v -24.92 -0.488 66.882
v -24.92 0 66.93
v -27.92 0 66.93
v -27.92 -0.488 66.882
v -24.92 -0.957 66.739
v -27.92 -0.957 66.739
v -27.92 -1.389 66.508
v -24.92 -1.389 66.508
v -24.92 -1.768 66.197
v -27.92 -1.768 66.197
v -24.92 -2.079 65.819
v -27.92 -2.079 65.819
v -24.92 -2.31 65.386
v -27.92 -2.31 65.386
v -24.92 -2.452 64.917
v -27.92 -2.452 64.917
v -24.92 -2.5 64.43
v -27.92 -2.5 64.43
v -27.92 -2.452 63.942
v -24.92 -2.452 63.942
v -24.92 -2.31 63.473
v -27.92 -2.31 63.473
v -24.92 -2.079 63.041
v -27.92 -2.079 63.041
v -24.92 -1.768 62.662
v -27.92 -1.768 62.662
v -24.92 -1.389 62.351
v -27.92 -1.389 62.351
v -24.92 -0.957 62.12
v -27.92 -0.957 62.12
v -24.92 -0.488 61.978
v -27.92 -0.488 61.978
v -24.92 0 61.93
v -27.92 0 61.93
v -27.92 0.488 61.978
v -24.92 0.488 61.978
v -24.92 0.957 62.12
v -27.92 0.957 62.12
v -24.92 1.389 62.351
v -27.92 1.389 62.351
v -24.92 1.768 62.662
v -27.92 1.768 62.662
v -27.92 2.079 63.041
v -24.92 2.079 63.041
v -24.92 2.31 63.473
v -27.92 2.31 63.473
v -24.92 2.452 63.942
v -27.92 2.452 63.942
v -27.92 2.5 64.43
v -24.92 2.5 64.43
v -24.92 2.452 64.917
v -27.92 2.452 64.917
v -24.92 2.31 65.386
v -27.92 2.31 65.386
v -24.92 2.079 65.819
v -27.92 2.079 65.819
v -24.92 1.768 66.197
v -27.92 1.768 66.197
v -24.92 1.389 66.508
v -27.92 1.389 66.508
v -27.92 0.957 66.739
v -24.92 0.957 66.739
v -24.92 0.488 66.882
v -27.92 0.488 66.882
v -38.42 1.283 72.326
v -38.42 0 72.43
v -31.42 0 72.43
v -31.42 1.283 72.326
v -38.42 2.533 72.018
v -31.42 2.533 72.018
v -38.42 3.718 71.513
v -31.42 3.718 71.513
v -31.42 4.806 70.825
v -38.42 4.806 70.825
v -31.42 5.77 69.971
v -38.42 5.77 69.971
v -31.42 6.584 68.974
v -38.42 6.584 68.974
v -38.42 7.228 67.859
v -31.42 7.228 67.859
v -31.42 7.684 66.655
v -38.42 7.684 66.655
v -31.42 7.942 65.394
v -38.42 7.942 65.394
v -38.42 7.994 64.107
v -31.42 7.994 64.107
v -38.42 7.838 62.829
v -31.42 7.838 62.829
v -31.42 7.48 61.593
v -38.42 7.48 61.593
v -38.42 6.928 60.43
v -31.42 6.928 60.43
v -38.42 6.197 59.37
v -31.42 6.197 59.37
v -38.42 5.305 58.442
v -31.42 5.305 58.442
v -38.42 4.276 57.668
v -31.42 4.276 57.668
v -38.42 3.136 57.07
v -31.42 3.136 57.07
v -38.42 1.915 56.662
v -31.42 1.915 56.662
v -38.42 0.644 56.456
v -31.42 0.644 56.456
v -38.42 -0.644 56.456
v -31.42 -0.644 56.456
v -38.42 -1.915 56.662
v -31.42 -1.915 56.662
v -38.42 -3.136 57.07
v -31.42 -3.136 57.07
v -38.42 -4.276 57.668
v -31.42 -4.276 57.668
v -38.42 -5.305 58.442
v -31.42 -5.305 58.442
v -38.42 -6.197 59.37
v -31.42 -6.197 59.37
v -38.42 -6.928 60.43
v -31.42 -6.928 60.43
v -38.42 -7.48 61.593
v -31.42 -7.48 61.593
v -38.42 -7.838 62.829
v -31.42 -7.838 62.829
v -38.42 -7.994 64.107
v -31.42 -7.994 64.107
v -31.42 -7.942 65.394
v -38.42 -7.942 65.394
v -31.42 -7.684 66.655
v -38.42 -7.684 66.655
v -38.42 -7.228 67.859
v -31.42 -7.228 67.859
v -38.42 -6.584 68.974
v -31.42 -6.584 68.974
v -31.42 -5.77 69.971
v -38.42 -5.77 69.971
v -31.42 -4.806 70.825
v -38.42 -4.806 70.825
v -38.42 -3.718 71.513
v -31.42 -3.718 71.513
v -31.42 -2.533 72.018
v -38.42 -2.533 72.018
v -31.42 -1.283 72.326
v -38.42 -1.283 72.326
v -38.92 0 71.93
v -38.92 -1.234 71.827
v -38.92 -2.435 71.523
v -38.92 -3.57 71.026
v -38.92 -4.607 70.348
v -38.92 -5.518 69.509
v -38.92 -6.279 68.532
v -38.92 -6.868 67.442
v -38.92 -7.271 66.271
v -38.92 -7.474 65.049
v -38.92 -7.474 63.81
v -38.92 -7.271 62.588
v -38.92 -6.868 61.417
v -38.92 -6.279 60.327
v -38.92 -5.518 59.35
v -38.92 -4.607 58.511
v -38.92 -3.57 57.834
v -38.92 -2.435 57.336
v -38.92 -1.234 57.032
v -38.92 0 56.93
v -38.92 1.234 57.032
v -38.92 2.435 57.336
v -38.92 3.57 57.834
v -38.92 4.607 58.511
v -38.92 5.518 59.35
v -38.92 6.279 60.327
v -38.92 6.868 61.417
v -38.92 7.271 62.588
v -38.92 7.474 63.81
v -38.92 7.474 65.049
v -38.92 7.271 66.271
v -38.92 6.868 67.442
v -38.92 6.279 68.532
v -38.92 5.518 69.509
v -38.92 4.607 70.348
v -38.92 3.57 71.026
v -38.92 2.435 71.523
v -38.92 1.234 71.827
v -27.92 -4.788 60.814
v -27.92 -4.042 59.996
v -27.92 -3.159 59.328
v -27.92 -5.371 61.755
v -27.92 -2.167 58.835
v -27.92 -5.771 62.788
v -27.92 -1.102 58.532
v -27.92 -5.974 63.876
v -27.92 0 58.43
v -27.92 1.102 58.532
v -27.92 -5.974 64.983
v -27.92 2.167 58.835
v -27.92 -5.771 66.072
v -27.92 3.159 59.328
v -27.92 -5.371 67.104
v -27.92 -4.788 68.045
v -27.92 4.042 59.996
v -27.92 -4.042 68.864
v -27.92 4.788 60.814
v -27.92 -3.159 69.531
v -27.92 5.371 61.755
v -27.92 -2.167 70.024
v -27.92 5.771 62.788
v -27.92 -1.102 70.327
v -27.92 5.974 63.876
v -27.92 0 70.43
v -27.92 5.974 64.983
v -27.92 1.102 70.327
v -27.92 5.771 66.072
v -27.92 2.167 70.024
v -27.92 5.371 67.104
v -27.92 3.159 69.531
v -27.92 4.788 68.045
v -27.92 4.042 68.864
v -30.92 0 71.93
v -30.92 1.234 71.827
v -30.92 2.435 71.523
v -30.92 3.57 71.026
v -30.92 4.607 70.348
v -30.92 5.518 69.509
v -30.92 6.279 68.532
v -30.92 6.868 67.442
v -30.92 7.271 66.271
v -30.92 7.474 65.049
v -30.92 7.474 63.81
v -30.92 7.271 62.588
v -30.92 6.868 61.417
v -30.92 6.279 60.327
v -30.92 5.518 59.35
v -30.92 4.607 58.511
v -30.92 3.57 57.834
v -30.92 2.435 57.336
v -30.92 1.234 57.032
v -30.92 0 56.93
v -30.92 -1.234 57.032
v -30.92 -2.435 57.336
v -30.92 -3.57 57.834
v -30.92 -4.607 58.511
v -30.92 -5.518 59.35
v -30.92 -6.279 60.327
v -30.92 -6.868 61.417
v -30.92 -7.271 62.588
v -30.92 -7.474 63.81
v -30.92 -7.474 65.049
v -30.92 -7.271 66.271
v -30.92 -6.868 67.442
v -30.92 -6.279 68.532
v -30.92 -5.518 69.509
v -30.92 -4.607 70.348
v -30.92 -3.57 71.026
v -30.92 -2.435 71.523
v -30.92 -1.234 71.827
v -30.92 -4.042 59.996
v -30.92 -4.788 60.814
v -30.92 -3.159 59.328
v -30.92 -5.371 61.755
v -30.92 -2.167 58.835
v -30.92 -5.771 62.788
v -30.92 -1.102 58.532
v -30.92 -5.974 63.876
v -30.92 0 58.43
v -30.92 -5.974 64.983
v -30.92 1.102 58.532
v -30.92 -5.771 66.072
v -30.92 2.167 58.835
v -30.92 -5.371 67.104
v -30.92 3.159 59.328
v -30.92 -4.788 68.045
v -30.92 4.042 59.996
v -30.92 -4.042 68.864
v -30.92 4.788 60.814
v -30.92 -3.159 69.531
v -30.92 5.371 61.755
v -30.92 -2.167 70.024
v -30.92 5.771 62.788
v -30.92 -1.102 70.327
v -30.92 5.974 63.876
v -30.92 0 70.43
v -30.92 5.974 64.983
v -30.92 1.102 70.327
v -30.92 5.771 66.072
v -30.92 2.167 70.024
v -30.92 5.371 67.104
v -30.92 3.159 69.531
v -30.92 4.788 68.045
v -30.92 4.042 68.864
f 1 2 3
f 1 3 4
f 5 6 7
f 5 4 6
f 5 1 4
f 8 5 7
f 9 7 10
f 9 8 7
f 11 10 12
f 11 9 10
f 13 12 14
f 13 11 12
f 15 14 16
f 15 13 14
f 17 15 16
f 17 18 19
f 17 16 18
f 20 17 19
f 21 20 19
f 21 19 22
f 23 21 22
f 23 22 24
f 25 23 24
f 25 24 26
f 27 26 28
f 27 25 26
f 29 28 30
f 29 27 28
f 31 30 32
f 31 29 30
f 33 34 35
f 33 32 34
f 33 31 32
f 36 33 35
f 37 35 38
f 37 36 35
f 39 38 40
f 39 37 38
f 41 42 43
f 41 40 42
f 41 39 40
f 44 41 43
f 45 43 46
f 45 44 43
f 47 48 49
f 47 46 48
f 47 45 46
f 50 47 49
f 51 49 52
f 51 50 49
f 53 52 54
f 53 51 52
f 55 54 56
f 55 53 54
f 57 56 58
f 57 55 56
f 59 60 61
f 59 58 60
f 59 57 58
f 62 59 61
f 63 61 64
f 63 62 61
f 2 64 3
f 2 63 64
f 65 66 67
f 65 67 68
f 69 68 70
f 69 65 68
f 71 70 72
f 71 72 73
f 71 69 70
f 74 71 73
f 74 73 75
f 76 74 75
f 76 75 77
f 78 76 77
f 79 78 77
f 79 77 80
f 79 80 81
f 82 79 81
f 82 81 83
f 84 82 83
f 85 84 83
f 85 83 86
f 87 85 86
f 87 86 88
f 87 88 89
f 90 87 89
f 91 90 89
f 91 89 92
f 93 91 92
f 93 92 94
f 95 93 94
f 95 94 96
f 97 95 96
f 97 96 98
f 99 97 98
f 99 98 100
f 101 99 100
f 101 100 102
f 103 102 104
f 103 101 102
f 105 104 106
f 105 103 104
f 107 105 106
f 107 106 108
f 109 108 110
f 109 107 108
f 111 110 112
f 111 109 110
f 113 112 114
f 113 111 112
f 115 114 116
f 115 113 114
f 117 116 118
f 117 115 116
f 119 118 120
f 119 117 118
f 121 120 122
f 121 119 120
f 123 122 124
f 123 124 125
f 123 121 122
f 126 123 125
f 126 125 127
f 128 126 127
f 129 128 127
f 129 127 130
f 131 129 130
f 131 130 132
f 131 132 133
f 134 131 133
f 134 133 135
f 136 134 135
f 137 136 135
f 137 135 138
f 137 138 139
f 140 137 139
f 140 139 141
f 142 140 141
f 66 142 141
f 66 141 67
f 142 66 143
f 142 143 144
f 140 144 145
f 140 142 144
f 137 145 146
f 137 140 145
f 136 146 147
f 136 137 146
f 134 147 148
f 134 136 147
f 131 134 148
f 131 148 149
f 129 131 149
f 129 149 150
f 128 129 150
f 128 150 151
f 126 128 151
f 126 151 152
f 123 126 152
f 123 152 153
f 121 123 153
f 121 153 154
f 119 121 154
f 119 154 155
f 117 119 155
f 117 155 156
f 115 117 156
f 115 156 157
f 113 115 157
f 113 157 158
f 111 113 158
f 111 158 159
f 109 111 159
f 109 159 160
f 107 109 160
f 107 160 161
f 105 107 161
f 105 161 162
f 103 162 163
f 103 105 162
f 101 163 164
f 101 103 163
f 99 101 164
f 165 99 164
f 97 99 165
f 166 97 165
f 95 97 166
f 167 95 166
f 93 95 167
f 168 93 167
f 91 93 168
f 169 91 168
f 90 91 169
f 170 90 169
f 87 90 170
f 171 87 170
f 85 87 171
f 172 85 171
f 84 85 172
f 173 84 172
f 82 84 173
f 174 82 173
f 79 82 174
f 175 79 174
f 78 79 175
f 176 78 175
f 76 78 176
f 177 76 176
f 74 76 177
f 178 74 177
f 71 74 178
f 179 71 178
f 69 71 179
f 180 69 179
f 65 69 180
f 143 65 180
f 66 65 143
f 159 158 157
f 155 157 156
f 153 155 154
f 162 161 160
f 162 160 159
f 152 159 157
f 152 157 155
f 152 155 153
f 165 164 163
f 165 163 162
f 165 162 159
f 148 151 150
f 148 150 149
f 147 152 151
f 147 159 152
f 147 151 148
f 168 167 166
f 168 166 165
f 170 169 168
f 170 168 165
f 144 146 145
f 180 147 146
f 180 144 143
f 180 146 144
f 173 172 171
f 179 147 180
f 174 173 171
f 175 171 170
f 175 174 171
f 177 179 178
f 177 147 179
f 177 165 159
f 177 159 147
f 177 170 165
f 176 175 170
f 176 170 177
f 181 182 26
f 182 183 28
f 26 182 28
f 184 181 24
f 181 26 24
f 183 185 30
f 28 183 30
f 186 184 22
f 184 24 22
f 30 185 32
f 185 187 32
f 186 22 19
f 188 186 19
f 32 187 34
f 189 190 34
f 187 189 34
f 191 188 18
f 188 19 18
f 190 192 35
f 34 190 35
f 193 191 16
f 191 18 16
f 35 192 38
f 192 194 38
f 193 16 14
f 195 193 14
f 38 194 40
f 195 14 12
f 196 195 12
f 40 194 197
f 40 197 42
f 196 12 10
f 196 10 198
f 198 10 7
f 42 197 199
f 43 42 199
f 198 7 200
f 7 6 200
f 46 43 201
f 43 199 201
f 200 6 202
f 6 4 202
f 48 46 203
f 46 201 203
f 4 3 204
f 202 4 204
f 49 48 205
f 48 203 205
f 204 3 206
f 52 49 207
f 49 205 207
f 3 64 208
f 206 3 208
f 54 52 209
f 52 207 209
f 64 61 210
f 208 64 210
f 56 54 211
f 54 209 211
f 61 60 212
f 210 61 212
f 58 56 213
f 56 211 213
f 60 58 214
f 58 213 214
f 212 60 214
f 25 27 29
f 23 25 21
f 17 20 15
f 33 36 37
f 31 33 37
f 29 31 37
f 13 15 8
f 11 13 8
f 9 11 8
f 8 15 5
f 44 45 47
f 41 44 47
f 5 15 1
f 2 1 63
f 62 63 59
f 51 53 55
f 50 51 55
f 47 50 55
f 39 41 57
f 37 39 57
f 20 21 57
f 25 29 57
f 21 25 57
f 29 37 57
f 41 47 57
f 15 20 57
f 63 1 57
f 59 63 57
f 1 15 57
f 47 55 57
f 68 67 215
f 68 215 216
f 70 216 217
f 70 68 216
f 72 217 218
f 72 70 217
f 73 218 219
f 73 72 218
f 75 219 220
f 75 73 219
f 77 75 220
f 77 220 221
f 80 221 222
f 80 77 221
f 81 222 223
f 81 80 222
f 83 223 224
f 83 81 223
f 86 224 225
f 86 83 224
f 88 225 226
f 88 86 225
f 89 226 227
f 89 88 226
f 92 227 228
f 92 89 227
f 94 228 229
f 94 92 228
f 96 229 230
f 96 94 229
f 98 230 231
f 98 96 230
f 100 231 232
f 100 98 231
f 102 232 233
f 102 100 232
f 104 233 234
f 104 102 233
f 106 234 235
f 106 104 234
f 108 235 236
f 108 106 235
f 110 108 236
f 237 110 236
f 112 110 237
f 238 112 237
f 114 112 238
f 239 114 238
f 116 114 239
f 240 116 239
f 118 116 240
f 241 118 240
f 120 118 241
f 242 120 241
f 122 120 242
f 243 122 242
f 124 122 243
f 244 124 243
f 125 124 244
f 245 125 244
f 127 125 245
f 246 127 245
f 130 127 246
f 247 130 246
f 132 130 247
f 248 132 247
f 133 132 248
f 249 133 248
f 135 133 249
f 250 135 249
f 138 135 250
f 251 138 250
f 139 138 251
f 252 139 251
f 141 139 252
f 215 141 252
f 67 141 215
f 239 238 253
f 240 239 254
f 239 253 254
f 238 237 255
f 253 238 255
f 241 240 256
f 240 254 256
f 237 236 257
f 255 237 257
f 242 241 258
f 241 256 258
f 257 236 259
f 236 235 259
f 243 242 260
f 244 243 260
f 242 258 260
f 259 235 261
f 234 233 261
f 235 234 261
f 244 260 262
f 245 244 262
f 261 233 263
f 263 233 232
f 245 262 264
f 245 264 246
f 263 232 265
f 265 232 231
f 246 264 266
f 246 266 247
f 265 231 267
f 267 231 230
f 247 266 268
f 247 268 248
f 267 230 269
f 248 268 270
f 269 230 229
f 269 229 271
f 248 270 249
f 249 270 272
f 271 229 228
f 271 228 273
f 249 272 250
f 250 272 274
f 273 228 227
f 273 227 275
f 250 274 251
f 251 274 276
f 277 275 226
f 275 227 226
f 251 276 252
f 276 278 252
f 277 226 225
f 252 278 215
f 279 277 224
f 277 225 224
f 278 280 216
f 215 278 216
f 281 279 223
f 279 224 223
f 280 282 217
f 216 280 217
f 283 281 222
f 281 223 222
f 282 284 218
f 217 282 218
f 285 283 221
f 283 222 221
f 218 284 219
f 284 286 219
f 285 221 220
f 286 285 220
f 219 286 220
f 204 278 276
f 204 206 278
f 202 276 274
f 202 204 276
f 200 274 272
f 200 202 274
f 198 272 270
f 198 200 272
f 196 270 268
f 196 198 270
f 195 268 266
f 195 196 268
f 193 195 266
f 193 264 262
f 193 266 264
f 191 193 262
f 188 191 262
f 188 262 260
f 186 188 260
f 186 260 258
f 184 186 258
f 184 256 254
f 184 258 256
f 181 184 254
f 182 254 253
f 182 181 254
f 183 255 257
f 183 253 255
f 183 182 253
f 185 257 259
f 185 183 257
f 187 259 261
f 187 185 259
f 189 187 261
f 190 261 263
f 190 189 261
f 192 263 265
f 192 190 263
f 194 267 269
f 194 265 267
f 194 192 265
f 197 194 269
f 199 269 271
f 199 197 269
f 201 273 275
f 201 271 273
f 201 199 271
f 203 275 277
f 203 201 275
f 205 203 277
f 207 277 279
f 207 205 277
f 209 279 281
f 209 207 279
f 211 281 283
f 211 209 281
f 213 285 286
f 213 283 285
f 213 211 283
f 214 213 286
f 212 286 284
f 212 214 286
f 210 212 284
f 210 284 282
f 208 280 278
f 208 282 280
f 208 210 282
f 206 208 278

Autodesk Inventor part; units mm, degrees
ref_plane "YZ Plane" through (0, 0, 0) normal (1, 0, 0) x (0, 1, 0)
ref_plane "XZ Plane" through (0, 0, 0) normal (0, 1, 0) x (-1, 0, 0)
ref_plane "XY Plane" through (0, 0, 0) normal (0, 0, 1) x (1, 0, 0)
sketch "スケッチ1" plane through (0, 0, 0) normal (0, 1, 0) x (-1, 0, 0)
  line L0 (-5.0796, -45.5704) -> (-5.0796, 73.9296)
  line L1 (-5.0796, 73.9296) -> (-4.5796, 74.4296)
  line L2 (-4.5796, 74.4296) -> (24.4204, 74.4296)
  line L3 (24.4204, 74.4296) -> (24.9204, 73.9296)
  line L4 (24.9204, 73.9296) -> (24.9204, -45.5704)
  line L5 (24.9204, -45.5704) -> (-5.0796, -45.5704)
  line L6 (1.9204, -47.0704) -> (1.9204, -50.5704)
  line L7 (1.9204, -50.5704) -> (17.9204, -50.5704)
  line L8 (17.9204, -50.5704) -> (17.9204, -47.0704)
  line L9 (17.9204, -47.0704) -> (1.9204, -47.0704)
  line L10 (2.9204, -47.0704) -> (2.9204, -45.5704)
  line L11 (16.9204, -45.5704) -> (16.9204, -47.0704)
  line L12 (31.4204, 56.4296) -> (30.9204, 56.9296)
  line L13 (30.9204, 56.9296) -> (30.9204, 71.9296)
  line L14 (30.9204, 71.9296) -> (31.4204, 72.4296)
  line L15 (31.4204, 72.4296) -> (38.4204, 72.4296)
  line L16 (38.4204, 72.4296) -> (38.9204, 71.9296)
  line L17 (38.9204, 71.9296) -> (38.9204, 56.9296)
  line L18 (38.9204, 56.9296) -> (38.4204, 56.4296)
  line L19 (38.4204, 56.4296) -> (31.4204, 56.4296)
  line L20 (31.4204, 56.4296) -> (31.4204, 72.4296)
  line L21 (30.9204, 70.4296) -> (27.9204, 70.4296)
  line L22 (27.9204, 70.4296) -> (27.9204, 58.4296)
  line L23 (27.9204, 58.4296) -> (30.9204, 58.4296)
  line L24 (38.4204, 56.4296) -> (38.4204, 72.4296)
  line L25 (27.9204, 66.9296) -> (24.9204, 66.9296)
  line L26 (27.4204, 66.9296) -> (27.4204, 61.9296)
  line L27 (27.9204, 61.9296) -> (24.9204, 61.9296)
  line L28 (24.9204, 73.9296) -> (-5.0796, 73.9296)
  line L29 (-5.0796, 97.1797) -> (24.9204, 97.1797)
  line L30 (24.9204, 97.1797) -> (24.9204, 105.1797)
  line L31 (24.9204, 105.1797) -> (-5.0796, 105.1797)
  line L32 (-5.0796, 105.1797) -> (-5.0796, 97.1797)
  line L33 (24.9204, 99.1797) -> (27.9204, 99.1797)
  line L34 (27.2723, 99.1797) -> (27.2723, 103.1797)
  line L35 (27.9204, 103.1797) -> (24.9204, 103.1797)
  line L36 (27.9204, 105.6797) -> (27.9204, 96.6797)
  line L37 (27.9204, 96.6797) -> (28.4204, 96.1797)
  line L38 (28.4204, 96.1797) -> (32.4204, 96.1797)
  line L39 (32.4204, 96.1797) -> (32.9204, 96.6797)
  line L40 (32.9204, 96.6797) -> (32.9204, 105.6797)
  line L41 (32.9204, 105.6797) -> (32.4204, 106.1797)
  line L42 (32.4204, 106.1797) -> (28.4204, 106.1797)
  line L43 (28.4204, 106.1797) -> (27.9204, 105.6797)
  line L44 (28.4204, 106.1797) -> (28.4204, 96.1797)
  line L45 (32.4204, 96.1797) -> (32.4204, 106.1797)
  line L46 (2.4204, -50.5704) -> (2.4204, -47.0704)
  line L47 (-0.0796, -40.5704) -> (-0.0796, 74.4296)
  line L48 (19.9204, 74.4296) -> (19.9204, -40.5704)
  line L49 (19.9204, -40.5704) -> (9.9204, -46.3439)
  line L50 (9.9204, -46.3439) -> (-0.0796, -40.5704)
  line L51 (-0.0796, -40.5704) -> (19.9204, -40.5704)
  line L52 (17.4204, -47.0704) -> (17.4204, -50.5704)
  line L53 (9.9204, -56.5156) -> (9.9204, 78.76)
  line L54 (9.9204, 93.5864) -> (9.9204, 108.5157)
  line L55 (19.9204, 105.1797) -> (19.9204, 97.1797)
  line L56 (22.5096, 101.1797) -> (35.2156, 101.1797)
  line L57 (27.9204, 103.1797) -> (27.2723, 102.4797)
  line L58 (27.2723, 102.4797) -> (24.9204, 102.4797)
  line L59 (24.9204, 99.8797) -> (27.2723, 99.8797)
  line L60 (27.2723, 99.8797) -> (27.9204, 99.1797)
  line L61 (-0.0796, 97.1797) -> (-0.0796, 105.1797)
  line L62 (24.9204, 66.2296) -> (27.4204, 66.2296)
  line L63 (27.4204, 66.2296) -> (27.9204, 66.9296)
  line L64 (27.4204, 62.6296) -> (27.9204, 61.9296)
  line L65 (27.4204, 62.6296) -> (24.9204, 62.6296)
  line L66 (22.6428, 64.4296) -> (42.5049, 64.4296)
  line L67 (32.2954, 71.4296) -> (38.4204, 71.4296)
  line L68 (33.1704, 70.4296) -> (38.4204, 70.4296)
  line L69 (34.0454, 69.4296) -> (38.4204, 69.4296)
  line L70 (34.9204, 68.4296) -> (38.4204, 68.4296)
  line L71 (35.7954, 67.4296) -> (38.4204, 67.4296)
  line L72 (36.6704, 66.4296) -> (38.4204, 66.4296)
  line L73 (37.5454, 65.4296) -> (38.4204, 65.4296)
  line L74 (29.2204, 105.1797) -> (32.4204, 105.1797)
  line L75 (30.0204, 104.1797) -> (32.4204, 104.1797)
  line L76 (30.8204, 103.1797) -> (32.4204, 103.1797)
  line L77 (31.6204, 102.1797) -> (32.4204, 102.1797)
  point P0 (0, 0)
  point P1 (52.3578, -69.094)
  point P2 (52.3578, -59.2279)
  point P3 (24.9204, 64.4296)
  point P4 (38.9204, 64.4296)
revolve "回転1" add sketch "スケッチ1" angle 360 about axis through (-22.6428, 0, 64.4296) along (-1, 0, 0) contours L25 L26 L62 L4 | L62 L26 L66 L4 | L25 L63 L26 | L63 L22 L66 L26 | L22 L21 L13 L66 | L13 L14 L20 L66 | L20 L15 L24 L66 | L24 L16 L17 L66
thread "ねじ1" size "M5x0.8" class "6g" standard "ANSI Metric M Profile" full length
properties part number "stand_handle" material "アルミニウム 6061"
